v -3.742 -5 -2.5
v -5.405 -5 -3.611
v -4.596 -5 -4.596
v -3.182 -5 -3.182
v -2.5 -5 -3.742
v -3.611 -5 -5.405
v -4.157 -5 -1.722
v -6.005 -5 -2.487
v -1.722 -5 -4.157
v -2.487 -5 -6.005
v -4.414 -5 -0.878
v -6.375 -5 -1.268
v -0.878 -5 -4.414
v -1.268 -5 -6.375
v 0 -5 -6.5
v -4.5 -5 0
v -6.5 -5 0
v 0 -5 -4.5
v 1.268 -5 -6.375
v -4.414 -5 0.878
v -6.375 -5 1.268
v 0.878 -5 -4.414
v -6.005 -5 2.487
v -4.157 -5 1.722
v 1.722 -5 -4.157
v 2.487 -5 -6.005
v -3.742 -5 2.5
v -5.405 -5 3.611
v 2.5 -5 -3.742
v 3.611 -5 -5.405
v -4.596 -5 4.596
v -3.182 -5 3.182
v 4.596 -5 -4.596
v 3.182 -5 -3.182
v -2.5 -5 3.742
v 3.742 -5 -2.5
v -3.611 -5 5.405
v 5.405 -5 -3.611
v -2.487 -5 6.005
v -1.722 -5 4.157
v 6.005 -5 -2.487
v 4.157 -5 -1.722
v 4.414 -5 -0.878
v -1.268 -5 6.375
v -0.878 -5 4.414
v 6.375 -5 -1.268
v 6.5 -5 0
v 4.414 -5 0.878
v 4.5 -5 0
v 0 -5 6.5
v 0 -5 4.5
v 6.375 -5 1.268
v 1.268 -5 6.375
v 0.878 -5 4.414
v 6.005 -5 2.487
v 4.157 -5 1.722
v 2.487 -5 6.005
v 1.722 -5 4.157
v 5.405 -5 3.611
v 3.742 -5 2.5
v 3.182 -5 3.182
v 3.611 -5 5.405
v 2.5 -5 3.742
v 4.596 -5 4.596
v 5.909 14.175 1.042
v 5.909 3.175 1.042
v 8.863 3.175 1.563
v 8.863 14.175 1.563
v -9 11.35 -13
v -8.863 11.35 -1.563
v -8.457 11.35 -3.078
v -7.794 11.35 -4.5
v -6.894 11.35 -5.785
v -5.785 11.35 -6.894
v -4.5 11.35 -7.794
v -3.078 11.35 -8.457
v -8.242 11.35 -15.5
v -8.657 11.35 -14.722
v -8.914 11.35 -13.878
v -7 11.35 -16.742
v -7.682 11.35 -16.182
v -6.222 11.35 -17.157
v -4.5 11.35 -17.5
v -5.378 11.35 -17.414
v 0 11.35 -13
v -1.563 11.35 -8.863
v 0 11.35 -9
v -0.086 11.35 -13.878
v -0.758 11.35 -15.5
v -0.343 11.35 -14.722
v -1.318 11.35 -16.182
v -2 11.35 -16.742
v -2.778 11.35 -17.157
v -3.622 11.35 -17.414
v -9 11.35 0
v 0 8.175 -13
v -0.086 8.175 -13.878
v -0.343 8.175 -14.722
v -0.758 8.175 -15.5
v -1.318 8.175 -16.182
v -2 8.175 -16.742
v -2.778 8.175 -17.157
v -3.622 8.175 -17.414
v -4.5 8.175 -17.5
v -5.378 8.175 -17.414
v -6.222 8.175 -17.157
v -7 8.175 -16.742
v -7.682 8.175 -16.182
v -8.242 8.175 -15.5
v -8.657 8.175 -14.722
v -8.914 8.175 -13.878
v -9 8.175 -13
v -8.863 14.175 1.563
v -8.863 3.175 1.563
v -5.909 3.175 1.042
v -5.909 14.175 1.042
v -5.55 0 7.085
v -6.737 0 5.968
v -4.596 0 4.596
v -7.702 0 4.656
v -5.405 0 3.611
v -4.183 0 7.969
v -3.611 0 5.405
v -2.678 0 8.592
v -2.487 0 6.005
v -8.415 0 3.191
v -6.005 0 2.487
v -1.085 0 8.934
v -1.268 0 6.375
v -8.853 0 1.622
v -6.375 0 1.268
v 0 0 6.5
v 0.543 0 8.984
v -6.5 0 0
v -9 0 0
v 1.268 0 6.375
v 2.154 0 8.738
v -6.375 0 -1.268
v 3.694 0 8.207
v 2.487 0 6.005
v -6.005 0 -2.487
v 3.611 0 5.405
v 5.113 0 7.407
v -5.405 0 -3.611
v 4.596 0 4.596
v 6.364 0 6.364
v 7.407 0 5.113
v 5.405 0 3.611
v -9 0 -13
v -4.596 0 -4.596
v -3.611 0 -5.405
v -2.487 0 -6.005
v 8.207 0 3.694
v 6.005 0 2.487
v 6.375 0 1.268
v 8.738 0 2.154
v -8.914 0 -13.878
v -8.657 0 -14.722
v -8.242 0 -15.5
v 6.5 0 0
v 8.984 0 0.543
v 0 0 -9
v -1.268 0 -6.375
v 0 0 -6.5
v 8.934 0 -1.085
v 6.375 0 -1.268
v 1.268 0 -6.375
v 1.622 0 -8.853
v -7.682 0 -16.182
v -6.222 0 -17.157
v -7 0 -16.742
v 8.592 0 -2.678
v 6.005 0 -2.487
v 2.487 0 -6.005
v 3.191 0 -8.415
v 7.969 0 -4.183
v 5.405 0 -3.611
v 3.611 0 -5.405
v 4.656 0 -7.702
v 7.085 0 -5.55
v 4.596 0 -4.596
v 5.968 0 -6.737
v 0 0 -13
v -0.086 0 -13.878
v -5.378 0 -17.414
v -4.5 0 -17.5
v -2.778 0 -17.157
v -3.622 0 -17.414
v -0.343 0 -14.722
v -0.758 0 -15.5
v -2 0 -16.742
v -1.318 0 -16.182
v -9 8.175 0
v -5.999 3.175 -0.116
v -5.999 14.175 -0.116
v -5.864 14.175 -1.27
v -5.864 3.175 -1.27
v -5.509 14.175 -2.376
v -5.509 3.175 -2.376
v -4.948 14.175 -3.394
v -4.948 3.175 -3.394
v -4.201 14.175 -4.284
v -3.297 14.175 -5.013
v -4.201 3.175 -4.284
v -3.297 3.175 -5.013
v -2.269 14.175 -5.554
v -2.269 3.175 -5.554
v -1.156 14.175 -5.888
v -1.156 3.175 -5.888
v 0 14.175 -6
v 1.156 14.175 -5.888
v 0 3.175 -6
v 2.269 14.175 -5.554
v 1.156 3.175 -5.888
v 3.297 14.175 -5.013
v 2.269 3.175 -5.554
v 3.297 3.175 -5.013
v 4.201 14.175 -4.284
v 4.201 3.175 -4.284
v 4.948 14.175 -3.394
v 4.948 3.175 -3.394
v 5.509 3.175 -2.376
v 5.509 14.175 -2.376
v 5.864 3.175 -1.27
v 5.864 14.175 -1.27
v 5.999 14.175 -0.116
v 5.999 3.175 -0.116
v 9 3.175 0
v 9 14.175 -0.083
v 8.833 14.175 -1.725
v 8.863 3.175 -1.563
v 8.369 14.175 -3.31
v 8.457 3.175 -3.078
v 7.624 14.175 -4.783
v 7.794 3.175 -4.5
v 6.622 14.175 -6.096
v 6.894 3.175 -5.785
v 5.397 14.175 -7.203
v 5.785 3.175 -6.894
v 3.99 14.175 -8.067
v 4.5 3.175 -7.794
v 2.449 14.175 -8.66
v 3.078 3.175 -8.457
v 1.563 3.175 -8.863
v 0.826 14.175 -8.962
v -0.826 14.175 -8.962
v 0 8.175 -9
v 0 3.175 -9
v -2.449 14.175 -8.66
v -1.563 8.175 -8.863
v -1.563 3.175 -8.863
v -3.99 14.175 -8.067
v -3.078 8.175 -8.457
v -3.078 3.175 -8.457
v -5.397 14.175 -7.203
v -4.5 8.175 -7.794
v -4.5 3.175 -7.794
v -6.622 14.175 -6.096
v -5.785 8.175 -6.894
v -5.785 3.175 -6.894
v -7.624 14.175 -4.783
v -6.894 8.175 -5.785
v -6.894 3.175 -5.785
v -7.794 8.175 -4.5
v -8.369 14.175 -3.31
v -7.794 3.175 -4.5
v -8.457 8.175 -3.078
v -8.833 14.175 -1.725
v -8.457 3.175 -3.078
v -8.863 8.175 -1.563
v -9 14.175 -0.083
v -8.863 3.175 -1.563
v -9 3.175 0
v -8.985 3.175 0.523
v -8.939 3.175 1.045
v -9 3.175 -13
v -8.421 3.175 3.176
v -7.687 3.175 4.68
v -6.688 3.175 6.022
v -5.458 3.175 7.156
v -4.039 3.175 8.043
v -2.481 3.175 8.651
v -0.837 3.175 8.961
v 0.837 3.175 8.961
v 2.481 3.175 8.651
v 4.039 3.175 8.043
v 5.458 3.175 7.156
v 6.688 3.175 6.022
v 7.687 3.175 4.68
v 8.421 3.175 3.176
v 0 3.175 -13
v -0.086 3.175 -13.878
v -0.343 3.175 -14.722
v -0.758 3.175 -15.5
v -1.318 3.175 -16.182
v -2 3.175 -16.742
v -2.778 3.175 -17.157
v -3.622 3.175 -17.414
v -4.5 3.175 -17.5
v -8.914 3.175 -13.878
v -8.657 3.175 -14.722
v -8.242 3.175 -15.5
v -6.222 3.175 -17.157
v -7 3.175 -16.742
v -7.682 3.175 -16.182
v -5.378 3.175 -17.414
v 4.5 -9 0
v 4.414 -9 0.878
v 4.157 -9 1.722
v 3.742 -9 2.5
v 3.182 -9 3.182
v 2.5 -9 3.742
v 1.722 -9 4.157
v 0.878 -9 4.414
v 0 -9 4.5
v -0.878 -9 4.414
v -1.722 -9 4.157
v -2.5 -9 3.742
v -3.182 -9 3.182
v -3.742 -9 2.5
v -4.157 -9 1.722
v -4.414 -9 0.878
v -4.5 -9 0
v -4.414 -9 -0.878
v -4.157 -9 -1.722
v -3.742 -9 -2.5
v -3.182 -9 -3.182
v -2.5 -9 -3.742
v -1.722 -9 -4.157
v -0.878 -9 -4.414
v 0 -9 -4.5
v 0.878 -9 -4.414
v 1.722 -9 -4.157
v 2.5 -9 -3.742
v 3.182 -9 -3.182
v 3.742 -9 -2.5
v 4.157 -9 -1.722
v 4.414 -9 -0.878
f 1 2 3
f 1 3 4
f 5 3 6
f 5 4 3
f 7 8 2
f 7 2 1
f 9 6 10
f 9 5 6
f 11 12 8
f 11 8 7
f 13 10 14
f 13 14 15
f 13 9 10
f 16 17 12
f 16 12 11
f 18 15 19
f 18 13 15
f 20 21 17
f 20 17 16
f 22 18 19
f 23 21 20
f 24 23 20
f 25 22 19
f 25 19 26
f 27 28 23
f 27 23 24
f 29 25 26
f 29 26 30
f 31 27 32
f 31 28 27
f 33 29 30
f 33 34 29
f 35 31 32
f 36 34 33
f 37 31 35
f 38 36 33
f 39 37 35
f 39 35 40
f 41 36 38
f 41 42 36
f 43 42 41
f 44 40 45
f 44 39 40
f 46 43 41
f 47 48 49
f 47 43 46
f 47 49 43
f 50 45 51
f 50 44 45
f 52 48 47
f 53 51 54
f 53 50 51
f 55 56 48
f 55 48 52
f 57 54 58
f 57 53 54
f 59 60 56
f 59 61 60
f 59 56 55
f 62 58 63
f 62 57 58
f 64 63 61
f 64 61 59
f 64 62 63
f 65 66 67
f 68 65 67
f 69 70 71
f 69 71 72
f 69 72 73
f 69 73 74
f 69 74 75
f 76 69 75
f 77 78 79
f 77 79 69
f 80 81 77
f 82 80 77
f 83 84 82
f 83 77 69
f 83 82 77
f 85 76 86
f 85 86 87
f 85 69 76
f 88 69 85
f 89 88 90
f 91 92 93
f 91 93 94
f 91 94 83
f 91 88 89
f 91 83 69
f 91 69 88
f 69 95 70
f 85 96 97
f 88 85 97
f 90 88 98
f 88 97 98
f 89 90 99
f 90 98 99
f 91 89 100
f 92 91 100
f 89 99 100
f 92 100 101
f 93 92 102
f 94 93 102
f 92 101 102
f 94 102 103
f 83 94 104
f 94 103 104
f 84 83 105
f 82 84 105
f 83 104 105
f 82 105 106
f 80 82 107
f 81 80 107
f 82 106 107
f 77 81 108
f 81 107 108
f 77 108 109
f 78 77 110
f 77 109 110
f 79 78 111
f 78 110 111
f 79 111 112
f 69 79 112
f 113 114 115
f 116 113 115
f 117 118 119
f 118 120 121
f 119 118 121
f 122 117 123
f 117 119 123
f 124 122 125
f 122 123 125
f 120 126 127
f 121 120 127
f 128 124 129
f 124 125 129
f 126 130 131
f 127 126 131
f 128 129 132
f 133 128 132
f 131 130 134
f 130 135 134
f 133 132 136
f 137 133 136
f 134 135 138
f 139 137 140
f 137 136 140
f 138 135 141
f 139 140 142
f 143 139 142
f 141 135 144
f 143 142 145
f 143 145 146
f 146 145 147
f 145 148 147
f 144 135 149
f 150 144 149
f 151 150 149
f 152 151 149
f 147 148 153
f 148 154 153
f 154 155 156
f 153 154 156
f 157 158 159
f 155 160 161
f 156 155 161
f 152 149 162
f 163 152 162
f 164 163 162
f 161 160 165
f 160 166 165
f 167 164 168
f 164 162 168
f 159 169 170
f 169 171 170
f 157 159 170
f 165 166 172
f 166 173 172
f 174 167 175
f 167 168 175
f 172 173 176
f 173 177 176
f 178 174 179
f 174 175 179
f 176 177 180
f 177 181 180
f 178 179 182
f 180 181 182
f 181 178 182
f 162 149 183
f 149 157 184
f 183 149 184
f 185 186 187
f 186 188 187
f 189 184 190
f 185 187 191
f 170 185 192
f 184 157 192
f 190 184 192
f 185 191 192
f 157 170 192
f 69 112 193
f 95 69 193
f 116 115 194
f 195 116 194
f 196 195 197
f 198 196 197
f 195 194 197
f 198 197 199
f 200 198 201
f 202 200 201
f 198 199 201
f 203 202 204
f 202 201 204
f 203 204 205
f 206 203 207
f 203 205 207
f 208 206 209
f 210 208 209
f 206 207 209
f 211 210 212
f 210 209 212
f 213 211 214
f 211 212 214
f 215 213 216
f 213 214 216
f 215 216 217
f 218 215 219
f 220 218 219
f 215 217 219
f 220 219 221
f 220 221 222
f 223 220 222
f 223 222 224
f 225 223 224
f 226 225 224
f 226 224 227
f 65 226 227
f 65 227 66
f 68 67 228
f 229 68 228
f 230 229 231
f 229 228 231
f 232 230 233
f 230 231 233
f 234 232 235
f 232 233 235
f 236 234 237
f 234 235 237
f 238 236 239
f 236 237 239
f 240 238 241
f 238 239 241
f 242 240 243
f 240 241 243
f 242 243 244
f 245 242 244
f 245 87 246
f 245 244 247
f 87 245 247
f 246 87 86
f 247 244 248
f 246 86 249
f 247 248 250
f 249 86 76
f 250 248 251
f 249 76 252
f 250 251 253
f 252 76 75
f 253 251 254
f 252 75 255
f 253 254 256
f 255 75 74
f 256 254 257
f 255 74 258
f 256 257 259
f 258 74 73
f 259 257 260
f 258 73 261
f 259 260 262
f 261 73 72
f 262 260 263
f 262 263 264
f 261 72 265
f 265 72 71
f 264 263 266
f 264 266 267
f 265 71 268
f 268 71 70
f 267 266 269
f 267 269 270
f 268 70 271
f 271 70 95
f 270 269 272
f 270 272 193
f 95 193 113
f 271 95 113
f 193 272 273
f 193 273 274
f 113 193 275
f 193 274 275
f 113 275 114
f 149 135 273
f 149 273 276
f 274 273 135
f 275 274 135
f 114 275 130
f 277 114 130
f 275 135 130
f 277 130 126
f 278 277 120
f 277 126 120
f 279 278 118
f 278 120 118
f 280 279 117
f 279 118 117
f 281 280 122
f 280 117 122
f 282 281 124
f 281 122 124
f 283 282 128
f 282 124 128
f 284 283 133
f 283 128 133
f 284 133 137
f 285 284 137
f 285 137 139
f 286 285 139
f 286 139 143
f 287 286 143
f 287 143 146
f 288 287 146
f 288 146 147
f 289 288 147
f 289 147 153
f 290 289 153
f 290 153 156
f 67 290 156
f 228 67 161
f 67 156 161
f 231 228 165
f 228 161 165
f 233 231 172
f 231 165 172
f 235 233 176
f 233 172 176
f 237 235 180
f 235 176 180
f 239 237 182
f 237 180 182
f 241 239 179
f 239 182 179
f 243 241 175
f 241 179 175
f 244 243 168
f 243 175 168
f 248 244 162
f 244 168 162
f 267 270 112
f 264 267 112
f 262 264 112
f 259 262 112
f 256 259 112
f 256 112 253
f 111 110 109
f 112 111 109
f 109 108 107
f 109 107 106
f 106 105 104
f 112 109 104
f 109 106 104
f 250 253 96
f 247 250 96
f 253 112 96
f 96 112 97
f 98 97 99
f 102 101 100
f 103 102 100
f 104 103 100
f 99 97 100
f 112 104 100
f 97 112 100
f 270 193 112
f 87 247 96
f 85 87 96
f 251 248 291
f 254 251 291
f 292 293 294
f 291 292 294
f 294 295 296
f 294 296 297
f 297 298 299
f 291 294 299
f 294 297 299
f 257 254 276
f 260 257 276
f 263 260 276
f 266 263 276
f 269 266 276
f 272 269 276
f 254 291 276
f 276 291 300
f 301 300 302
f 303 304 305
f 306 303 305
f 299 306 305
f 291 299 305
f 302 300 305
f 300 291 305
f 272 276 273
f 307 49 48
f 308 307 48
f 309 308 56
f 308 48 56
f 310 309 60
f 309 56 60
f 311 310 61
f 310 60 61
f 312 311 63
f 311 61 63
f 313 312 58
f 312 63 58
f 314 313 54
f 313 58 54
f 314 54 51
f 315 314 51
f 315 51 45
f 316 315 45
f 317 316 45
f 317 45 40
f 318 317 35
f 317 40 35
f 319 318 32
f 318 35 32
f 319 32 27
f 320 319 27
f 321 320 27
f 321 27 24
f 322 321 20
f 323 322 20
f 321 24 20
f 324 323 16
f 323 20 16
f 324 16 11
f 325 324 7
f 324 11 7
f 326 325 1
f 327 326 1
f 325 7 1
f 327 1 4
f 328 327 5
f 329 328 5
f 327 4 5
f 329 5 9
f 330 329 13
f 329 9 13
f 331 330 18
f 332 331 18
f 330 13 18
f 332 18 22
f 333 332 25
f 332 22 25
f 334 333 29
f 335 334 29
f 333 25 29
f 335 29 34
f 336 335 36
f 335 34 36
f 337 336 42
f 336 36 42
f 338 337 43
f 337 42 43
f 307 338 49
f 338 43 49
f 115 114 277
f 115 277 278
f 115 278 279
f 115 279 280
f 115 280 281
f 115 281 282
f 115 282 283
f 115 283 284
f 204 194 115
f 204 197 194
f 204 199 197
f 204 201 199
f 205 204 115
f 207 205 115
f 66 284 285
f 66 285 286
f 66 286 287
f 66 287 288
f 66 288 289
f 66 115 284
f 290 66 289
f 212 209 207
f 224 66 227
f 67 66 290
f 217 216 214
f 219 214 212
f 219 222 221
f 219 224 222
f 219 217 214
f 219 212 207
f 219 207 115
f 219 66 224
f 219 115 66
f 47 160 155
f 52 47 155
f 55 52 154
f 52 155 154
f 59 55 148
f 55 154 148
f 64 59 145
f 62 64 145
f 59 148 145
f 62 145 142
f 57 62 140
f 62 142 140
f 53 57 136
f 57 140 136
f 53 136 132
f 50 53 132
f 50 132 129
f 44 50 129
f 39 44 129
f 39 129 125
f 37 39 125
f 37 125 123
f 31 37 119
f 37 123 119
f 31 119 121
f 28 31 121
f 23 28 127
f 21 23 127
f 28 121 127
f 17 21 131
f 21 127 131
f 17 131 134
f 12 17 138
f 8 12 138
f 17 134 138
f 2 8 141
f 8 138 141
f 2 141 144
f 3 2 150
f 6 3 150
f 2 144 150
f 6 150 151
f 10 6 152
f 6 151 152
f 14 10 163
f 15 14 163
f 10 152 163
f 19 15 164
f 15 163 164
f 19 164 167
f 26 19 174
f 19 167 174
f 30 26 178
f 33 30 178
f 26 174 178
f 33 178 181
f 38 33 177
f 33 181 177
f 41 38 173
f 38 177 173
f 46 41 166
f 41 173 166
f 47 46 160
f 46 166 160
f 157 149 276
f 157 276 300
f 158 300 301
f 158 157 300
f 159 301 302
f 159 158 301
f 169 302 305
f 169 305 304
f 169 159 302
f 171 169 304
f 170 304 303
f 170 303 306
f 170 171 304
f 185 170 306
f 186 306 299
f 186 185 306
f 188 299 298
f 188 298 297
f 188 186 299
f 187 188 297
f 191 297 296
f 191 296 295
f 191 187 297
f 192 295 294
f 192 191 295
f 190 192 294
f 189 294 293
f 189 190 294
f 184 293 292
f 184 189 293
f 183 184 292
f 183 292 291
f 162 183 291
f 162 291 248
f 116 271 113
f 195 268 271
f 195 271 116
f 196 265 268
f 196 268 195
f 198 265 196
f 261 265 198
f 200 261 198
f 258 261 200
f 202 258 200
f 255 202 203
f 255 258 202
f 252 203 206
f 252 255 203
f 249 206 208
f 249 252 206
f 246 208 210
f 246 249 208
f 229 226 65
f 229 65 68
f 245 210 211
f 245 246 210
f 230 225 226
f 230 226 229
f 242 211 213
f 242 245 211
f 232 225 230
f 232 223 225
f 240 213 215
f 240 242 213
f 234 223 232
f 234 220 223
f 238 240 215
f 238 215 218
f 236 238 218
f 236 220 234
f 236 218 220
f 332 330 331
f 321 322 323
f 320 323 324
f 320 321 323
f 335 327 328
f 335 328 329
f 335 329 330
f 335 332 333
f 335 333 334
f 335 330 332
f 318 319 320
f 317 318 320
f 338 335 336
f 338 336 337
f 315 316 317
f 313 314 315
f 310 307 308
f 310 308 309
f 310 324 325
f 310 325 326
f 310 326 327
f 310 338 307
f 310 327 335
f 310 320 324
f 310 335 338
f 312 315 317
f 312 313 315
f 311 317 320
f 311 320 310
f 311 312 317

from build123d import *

# Parameters (mm, degrees)
SKETCH1_R           = 9
BOSS_EXTRUDE1_DEPTH = 3.175
BOSS_EXTRUDE2_DEPTH = 11
SKETCH4_R           = 6.5
BOSS_EXTRUDE3_DEPTH = 5
SKETCH5_R           = 4.5
BOSS_EXTRUDE4_DEPTH = 4
BOSS_EXTRUDE5_DEPTH = 3.175
BOSS_EXTRUDE6_DEPTH = 3.175


with BuildPart() as part:
    # Sketch1 → Boss-Extrude1 (new body)
    with BuildSketch(Plane(origin=(0, 0, 0), x_dir=(1, 0, 0), z_dir=(0, 1, 0))):
        Circle(SKETCH1_R)
    extrude(amount=BOSS_EXTRUDE1_DEPTH)

    # Sketch3 → Boss-Extrude2 (add)
    with BuildSketch(Plane(origin=(0, 3.175, 0), x_dir=(1, 0, 0), z_dir=(0, 1, 0))):
        with BuildLine():
            Line((-8.863269777, -1.562833599), (-5.908846518, -1.041889066))
            ThreePointArc((-5.908846518, -1.041889066), (0, 6), (5.908846518, -1.041889066))
            Line((5.908846518, -1.041889066), (8.863269777, -1.562833599))
            ThreePointArc((8.863269777, -1.562833599), (0, 9), (-8.863269777, -1.562833599))
        make_face()
    extrude(amount=BOSS_EXTRUDE2_DEPTH)

    # Sketch4 → Boss-Extrude3 (add)
    with BuildSketch(Plane.XZ):
        Circle(SKETCH4_R)
    extrude(amount=BOSS_EXTRUDE3_DEPTH)

    # Sketch5 → Boss-Extrude4 (add)
    with BuildSketch(Plane.XZ.offset(5)):
        Circle(SKETCH5_R)
    extrude(amount=BOSS_EXTRUDE4_DEPTH)

    # Sketch6 → Boss-Extrude5 (add)
    with BuildSketch(Plane(origin=(0, 0, 0), x_dir=(1, 0, 0), z_dir=(0, 1, 0))):
        with BuildLine():
            Line((-9, 0), (-9, 13))
            ThreePointArc((-9, 13), (-4.5, 17.5), (0, 13))
            Line((0, 13), (0, 9))
            ThreePointArc((0, 9), (-6.363961031, 6.363961031), (-9, 0))
        make_face()
    extrude(amount=BOSS_EXTRUDE5_DEPTH)

    # Sketch7 → Boss-Extrude6 (add)
    with BuildSketch(Plane(origin=(0, 8.174999906, 0), x_dir=(1, 0, 0), z_dir=(0, 1, 0))):
        with BuildLine():
            Line((0, 9), (0, 13))
            ThreePointArc((0, 13), (-4.5, 17.5), (-9, 13))
            Line((-9, 13), (-9, 0))
            ThreePointArc((-9, 0), (-6.363961031, 6.363961031), (0, 9))
        make_face()
    extrude(amount=BOSS_EXTRUDE6_DEPTH)


solid = part.part
